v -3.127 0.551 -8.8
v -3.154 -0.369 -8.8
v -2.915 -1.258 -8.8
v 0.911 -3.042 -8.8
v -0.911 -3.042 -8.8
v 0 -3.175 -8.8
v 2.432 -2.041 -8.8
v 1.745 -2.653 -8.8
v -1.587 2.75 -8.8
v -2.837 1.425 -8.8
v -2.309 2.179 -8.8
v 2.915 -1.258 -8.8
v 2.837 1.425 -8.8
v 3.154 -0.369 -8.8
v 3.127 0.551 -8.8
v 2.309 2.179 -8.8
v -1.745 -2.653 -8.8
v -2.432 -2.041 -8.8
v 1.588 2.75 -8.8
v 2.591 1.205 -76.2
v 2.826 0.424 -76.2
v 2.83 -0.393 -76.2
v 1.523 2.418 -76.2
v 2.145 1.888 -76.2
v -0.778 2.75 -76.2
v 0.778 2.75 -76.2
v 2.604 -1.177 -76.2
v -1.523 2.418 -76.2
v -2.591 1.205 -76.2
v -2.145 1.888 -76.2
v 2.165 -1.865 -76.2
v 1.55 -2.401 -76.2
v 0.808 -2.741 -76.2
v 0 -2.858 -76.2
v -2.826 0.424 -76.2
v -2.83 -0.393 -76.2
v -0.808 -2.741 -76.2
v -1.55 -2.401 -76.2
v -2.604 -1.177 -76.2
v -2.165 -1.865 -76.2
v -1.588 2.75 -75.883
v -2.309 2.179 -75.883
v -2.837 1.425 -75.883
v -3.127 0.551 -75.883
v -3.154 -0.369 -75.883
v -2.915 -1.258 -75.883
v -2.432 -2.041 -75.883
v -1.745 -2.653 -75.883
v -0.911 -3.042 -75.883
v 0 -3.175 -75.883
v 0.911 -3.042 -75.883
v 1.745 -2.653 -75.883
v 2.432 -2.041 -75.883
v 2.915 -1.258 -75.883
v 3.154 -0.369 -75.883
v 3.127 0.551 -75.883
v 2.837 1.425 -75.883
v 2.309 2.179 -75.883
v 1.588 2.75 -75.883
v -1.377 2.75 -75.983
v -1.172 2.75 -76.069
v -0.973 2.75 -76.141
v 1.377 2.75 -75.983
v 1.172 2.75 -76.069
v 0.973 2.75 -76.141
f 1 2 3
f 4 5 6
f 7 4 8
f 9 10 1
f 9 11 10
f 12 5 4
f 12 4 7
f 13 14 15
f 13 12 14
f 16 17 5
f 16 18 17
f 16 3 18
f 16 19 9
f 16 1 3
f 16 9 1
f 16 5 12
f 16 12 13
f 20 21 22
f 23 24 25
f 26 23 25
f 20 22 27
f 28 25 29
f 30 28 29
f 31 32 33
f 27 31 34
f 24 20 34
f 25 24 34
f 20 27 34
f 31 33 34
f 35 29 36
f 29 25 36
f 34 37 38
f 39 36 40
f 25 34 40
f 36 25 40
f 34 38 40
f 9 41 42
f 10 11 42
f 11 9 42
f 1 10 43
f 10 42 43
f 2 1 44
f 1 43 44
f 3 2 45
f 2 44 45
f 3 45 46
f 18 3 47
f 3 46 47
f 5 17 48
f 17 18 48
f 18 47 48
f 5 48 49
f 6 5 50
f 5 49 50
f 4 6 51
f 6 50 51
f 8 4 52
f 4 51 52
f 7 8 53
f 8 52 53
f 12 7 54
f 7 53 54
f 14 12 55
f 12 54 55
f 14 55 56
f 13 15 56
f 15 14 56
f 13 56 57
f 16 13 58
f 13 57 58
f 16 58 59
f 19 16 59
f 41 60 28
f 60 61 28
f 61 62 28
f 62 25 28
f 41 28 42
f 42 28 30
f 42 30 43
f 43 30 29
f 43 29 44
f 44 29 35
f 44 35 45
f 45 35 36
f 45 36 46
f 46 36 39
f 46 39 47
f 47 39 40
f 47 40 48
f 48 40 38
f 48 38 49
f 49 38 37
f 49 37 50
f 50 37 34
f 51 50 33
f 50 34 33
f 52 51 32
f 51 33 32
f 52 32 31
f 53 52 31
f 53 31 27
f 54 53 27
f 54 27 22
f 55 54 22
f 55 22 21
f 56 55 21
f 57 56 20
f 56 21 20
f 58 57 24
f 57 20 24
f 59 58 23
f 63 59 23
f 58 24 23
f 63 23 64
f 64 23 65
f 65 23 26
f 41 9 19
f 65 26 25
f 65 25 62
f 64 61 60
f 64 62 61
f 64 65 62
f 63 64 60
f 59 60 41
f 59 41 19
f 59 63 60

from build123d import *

# Parameters (mm, degrees)
BOSS_EXTRUDE2_DEPTH      = 76.2
BOSS_EXTRUDE2_DEPTH_BACK = 76.2
SKETCH3_R                = 3.175
CUT_EXTRUDE5_DEPTH       = 77.332177029
CUT_EXTRUDE5_DEPTH_BACK  = 77.332177029
CHAMFER1_SIZE            = 0.3175
SKETCH11_W               = 9.577733326
SKETCH11_H               = 8.205515822
CUT_EXTRUDE6_DEPTH       = 85


with BuildPart() as part:
    # Sketch3 → Boss-Extrude2 (new, two sides: drawn at the far end of the back side and taken through both)
    with BuildSketch(Plane.XY.offset(-BOSS_EXTRUDE2_DEPTH_BACK)):
        with Locations(Location((0, 0, 0), (0, 0, 180))):
            Circle(SKETCH3_R)
    extrude(amount=BOSS_EXTRUDE2_DEPTH + BOSS_EXTRUDE2_DEPTH_BACK)

    # Sketch10 → Cut-Extrude5 (cut, two sides: drawn at the far end of the back side and taken through both)
    with BuildSketch(Plane.XY.offset(-CUT_EXTRUDE5_DEPTH_BACK)):
        with BuildLine():
            Line((-1.5875, 2.749630657), (1.5875, 2.749630657))
            ThreePointArc((1.5875, 2.749630657), (0, 3.175), (-1.5875, 2.749630657))
        make_face()
    extrude(amount=CUT_EXTRUDE5_DEPTH + CUT_EXTRUDE5_DEPTH_BACK, mode=Mode.SUBTRACT)

    # Chamfer1
    chamfer1_edges = [part.edges().sort_by_distance(p)[0] for p in [
        (0, -3.175, -76.2),
        (0, -3.175, 76.2),
    ]]
    chamfer(chamfer1_edges, length=CHAMFER1_SIZE)

    # Sketch11 → Cut-Extrude6 (cut)
    with BuildSketch(Plane.XY.offset(76.2)):
        Rectangle(SKETCH11_W, SKETCH11_H)
    extrude(amount=-CUT_EXTRUDE6_DEPTH, mode=Mode.SUBTRACT)


solid = part.part
